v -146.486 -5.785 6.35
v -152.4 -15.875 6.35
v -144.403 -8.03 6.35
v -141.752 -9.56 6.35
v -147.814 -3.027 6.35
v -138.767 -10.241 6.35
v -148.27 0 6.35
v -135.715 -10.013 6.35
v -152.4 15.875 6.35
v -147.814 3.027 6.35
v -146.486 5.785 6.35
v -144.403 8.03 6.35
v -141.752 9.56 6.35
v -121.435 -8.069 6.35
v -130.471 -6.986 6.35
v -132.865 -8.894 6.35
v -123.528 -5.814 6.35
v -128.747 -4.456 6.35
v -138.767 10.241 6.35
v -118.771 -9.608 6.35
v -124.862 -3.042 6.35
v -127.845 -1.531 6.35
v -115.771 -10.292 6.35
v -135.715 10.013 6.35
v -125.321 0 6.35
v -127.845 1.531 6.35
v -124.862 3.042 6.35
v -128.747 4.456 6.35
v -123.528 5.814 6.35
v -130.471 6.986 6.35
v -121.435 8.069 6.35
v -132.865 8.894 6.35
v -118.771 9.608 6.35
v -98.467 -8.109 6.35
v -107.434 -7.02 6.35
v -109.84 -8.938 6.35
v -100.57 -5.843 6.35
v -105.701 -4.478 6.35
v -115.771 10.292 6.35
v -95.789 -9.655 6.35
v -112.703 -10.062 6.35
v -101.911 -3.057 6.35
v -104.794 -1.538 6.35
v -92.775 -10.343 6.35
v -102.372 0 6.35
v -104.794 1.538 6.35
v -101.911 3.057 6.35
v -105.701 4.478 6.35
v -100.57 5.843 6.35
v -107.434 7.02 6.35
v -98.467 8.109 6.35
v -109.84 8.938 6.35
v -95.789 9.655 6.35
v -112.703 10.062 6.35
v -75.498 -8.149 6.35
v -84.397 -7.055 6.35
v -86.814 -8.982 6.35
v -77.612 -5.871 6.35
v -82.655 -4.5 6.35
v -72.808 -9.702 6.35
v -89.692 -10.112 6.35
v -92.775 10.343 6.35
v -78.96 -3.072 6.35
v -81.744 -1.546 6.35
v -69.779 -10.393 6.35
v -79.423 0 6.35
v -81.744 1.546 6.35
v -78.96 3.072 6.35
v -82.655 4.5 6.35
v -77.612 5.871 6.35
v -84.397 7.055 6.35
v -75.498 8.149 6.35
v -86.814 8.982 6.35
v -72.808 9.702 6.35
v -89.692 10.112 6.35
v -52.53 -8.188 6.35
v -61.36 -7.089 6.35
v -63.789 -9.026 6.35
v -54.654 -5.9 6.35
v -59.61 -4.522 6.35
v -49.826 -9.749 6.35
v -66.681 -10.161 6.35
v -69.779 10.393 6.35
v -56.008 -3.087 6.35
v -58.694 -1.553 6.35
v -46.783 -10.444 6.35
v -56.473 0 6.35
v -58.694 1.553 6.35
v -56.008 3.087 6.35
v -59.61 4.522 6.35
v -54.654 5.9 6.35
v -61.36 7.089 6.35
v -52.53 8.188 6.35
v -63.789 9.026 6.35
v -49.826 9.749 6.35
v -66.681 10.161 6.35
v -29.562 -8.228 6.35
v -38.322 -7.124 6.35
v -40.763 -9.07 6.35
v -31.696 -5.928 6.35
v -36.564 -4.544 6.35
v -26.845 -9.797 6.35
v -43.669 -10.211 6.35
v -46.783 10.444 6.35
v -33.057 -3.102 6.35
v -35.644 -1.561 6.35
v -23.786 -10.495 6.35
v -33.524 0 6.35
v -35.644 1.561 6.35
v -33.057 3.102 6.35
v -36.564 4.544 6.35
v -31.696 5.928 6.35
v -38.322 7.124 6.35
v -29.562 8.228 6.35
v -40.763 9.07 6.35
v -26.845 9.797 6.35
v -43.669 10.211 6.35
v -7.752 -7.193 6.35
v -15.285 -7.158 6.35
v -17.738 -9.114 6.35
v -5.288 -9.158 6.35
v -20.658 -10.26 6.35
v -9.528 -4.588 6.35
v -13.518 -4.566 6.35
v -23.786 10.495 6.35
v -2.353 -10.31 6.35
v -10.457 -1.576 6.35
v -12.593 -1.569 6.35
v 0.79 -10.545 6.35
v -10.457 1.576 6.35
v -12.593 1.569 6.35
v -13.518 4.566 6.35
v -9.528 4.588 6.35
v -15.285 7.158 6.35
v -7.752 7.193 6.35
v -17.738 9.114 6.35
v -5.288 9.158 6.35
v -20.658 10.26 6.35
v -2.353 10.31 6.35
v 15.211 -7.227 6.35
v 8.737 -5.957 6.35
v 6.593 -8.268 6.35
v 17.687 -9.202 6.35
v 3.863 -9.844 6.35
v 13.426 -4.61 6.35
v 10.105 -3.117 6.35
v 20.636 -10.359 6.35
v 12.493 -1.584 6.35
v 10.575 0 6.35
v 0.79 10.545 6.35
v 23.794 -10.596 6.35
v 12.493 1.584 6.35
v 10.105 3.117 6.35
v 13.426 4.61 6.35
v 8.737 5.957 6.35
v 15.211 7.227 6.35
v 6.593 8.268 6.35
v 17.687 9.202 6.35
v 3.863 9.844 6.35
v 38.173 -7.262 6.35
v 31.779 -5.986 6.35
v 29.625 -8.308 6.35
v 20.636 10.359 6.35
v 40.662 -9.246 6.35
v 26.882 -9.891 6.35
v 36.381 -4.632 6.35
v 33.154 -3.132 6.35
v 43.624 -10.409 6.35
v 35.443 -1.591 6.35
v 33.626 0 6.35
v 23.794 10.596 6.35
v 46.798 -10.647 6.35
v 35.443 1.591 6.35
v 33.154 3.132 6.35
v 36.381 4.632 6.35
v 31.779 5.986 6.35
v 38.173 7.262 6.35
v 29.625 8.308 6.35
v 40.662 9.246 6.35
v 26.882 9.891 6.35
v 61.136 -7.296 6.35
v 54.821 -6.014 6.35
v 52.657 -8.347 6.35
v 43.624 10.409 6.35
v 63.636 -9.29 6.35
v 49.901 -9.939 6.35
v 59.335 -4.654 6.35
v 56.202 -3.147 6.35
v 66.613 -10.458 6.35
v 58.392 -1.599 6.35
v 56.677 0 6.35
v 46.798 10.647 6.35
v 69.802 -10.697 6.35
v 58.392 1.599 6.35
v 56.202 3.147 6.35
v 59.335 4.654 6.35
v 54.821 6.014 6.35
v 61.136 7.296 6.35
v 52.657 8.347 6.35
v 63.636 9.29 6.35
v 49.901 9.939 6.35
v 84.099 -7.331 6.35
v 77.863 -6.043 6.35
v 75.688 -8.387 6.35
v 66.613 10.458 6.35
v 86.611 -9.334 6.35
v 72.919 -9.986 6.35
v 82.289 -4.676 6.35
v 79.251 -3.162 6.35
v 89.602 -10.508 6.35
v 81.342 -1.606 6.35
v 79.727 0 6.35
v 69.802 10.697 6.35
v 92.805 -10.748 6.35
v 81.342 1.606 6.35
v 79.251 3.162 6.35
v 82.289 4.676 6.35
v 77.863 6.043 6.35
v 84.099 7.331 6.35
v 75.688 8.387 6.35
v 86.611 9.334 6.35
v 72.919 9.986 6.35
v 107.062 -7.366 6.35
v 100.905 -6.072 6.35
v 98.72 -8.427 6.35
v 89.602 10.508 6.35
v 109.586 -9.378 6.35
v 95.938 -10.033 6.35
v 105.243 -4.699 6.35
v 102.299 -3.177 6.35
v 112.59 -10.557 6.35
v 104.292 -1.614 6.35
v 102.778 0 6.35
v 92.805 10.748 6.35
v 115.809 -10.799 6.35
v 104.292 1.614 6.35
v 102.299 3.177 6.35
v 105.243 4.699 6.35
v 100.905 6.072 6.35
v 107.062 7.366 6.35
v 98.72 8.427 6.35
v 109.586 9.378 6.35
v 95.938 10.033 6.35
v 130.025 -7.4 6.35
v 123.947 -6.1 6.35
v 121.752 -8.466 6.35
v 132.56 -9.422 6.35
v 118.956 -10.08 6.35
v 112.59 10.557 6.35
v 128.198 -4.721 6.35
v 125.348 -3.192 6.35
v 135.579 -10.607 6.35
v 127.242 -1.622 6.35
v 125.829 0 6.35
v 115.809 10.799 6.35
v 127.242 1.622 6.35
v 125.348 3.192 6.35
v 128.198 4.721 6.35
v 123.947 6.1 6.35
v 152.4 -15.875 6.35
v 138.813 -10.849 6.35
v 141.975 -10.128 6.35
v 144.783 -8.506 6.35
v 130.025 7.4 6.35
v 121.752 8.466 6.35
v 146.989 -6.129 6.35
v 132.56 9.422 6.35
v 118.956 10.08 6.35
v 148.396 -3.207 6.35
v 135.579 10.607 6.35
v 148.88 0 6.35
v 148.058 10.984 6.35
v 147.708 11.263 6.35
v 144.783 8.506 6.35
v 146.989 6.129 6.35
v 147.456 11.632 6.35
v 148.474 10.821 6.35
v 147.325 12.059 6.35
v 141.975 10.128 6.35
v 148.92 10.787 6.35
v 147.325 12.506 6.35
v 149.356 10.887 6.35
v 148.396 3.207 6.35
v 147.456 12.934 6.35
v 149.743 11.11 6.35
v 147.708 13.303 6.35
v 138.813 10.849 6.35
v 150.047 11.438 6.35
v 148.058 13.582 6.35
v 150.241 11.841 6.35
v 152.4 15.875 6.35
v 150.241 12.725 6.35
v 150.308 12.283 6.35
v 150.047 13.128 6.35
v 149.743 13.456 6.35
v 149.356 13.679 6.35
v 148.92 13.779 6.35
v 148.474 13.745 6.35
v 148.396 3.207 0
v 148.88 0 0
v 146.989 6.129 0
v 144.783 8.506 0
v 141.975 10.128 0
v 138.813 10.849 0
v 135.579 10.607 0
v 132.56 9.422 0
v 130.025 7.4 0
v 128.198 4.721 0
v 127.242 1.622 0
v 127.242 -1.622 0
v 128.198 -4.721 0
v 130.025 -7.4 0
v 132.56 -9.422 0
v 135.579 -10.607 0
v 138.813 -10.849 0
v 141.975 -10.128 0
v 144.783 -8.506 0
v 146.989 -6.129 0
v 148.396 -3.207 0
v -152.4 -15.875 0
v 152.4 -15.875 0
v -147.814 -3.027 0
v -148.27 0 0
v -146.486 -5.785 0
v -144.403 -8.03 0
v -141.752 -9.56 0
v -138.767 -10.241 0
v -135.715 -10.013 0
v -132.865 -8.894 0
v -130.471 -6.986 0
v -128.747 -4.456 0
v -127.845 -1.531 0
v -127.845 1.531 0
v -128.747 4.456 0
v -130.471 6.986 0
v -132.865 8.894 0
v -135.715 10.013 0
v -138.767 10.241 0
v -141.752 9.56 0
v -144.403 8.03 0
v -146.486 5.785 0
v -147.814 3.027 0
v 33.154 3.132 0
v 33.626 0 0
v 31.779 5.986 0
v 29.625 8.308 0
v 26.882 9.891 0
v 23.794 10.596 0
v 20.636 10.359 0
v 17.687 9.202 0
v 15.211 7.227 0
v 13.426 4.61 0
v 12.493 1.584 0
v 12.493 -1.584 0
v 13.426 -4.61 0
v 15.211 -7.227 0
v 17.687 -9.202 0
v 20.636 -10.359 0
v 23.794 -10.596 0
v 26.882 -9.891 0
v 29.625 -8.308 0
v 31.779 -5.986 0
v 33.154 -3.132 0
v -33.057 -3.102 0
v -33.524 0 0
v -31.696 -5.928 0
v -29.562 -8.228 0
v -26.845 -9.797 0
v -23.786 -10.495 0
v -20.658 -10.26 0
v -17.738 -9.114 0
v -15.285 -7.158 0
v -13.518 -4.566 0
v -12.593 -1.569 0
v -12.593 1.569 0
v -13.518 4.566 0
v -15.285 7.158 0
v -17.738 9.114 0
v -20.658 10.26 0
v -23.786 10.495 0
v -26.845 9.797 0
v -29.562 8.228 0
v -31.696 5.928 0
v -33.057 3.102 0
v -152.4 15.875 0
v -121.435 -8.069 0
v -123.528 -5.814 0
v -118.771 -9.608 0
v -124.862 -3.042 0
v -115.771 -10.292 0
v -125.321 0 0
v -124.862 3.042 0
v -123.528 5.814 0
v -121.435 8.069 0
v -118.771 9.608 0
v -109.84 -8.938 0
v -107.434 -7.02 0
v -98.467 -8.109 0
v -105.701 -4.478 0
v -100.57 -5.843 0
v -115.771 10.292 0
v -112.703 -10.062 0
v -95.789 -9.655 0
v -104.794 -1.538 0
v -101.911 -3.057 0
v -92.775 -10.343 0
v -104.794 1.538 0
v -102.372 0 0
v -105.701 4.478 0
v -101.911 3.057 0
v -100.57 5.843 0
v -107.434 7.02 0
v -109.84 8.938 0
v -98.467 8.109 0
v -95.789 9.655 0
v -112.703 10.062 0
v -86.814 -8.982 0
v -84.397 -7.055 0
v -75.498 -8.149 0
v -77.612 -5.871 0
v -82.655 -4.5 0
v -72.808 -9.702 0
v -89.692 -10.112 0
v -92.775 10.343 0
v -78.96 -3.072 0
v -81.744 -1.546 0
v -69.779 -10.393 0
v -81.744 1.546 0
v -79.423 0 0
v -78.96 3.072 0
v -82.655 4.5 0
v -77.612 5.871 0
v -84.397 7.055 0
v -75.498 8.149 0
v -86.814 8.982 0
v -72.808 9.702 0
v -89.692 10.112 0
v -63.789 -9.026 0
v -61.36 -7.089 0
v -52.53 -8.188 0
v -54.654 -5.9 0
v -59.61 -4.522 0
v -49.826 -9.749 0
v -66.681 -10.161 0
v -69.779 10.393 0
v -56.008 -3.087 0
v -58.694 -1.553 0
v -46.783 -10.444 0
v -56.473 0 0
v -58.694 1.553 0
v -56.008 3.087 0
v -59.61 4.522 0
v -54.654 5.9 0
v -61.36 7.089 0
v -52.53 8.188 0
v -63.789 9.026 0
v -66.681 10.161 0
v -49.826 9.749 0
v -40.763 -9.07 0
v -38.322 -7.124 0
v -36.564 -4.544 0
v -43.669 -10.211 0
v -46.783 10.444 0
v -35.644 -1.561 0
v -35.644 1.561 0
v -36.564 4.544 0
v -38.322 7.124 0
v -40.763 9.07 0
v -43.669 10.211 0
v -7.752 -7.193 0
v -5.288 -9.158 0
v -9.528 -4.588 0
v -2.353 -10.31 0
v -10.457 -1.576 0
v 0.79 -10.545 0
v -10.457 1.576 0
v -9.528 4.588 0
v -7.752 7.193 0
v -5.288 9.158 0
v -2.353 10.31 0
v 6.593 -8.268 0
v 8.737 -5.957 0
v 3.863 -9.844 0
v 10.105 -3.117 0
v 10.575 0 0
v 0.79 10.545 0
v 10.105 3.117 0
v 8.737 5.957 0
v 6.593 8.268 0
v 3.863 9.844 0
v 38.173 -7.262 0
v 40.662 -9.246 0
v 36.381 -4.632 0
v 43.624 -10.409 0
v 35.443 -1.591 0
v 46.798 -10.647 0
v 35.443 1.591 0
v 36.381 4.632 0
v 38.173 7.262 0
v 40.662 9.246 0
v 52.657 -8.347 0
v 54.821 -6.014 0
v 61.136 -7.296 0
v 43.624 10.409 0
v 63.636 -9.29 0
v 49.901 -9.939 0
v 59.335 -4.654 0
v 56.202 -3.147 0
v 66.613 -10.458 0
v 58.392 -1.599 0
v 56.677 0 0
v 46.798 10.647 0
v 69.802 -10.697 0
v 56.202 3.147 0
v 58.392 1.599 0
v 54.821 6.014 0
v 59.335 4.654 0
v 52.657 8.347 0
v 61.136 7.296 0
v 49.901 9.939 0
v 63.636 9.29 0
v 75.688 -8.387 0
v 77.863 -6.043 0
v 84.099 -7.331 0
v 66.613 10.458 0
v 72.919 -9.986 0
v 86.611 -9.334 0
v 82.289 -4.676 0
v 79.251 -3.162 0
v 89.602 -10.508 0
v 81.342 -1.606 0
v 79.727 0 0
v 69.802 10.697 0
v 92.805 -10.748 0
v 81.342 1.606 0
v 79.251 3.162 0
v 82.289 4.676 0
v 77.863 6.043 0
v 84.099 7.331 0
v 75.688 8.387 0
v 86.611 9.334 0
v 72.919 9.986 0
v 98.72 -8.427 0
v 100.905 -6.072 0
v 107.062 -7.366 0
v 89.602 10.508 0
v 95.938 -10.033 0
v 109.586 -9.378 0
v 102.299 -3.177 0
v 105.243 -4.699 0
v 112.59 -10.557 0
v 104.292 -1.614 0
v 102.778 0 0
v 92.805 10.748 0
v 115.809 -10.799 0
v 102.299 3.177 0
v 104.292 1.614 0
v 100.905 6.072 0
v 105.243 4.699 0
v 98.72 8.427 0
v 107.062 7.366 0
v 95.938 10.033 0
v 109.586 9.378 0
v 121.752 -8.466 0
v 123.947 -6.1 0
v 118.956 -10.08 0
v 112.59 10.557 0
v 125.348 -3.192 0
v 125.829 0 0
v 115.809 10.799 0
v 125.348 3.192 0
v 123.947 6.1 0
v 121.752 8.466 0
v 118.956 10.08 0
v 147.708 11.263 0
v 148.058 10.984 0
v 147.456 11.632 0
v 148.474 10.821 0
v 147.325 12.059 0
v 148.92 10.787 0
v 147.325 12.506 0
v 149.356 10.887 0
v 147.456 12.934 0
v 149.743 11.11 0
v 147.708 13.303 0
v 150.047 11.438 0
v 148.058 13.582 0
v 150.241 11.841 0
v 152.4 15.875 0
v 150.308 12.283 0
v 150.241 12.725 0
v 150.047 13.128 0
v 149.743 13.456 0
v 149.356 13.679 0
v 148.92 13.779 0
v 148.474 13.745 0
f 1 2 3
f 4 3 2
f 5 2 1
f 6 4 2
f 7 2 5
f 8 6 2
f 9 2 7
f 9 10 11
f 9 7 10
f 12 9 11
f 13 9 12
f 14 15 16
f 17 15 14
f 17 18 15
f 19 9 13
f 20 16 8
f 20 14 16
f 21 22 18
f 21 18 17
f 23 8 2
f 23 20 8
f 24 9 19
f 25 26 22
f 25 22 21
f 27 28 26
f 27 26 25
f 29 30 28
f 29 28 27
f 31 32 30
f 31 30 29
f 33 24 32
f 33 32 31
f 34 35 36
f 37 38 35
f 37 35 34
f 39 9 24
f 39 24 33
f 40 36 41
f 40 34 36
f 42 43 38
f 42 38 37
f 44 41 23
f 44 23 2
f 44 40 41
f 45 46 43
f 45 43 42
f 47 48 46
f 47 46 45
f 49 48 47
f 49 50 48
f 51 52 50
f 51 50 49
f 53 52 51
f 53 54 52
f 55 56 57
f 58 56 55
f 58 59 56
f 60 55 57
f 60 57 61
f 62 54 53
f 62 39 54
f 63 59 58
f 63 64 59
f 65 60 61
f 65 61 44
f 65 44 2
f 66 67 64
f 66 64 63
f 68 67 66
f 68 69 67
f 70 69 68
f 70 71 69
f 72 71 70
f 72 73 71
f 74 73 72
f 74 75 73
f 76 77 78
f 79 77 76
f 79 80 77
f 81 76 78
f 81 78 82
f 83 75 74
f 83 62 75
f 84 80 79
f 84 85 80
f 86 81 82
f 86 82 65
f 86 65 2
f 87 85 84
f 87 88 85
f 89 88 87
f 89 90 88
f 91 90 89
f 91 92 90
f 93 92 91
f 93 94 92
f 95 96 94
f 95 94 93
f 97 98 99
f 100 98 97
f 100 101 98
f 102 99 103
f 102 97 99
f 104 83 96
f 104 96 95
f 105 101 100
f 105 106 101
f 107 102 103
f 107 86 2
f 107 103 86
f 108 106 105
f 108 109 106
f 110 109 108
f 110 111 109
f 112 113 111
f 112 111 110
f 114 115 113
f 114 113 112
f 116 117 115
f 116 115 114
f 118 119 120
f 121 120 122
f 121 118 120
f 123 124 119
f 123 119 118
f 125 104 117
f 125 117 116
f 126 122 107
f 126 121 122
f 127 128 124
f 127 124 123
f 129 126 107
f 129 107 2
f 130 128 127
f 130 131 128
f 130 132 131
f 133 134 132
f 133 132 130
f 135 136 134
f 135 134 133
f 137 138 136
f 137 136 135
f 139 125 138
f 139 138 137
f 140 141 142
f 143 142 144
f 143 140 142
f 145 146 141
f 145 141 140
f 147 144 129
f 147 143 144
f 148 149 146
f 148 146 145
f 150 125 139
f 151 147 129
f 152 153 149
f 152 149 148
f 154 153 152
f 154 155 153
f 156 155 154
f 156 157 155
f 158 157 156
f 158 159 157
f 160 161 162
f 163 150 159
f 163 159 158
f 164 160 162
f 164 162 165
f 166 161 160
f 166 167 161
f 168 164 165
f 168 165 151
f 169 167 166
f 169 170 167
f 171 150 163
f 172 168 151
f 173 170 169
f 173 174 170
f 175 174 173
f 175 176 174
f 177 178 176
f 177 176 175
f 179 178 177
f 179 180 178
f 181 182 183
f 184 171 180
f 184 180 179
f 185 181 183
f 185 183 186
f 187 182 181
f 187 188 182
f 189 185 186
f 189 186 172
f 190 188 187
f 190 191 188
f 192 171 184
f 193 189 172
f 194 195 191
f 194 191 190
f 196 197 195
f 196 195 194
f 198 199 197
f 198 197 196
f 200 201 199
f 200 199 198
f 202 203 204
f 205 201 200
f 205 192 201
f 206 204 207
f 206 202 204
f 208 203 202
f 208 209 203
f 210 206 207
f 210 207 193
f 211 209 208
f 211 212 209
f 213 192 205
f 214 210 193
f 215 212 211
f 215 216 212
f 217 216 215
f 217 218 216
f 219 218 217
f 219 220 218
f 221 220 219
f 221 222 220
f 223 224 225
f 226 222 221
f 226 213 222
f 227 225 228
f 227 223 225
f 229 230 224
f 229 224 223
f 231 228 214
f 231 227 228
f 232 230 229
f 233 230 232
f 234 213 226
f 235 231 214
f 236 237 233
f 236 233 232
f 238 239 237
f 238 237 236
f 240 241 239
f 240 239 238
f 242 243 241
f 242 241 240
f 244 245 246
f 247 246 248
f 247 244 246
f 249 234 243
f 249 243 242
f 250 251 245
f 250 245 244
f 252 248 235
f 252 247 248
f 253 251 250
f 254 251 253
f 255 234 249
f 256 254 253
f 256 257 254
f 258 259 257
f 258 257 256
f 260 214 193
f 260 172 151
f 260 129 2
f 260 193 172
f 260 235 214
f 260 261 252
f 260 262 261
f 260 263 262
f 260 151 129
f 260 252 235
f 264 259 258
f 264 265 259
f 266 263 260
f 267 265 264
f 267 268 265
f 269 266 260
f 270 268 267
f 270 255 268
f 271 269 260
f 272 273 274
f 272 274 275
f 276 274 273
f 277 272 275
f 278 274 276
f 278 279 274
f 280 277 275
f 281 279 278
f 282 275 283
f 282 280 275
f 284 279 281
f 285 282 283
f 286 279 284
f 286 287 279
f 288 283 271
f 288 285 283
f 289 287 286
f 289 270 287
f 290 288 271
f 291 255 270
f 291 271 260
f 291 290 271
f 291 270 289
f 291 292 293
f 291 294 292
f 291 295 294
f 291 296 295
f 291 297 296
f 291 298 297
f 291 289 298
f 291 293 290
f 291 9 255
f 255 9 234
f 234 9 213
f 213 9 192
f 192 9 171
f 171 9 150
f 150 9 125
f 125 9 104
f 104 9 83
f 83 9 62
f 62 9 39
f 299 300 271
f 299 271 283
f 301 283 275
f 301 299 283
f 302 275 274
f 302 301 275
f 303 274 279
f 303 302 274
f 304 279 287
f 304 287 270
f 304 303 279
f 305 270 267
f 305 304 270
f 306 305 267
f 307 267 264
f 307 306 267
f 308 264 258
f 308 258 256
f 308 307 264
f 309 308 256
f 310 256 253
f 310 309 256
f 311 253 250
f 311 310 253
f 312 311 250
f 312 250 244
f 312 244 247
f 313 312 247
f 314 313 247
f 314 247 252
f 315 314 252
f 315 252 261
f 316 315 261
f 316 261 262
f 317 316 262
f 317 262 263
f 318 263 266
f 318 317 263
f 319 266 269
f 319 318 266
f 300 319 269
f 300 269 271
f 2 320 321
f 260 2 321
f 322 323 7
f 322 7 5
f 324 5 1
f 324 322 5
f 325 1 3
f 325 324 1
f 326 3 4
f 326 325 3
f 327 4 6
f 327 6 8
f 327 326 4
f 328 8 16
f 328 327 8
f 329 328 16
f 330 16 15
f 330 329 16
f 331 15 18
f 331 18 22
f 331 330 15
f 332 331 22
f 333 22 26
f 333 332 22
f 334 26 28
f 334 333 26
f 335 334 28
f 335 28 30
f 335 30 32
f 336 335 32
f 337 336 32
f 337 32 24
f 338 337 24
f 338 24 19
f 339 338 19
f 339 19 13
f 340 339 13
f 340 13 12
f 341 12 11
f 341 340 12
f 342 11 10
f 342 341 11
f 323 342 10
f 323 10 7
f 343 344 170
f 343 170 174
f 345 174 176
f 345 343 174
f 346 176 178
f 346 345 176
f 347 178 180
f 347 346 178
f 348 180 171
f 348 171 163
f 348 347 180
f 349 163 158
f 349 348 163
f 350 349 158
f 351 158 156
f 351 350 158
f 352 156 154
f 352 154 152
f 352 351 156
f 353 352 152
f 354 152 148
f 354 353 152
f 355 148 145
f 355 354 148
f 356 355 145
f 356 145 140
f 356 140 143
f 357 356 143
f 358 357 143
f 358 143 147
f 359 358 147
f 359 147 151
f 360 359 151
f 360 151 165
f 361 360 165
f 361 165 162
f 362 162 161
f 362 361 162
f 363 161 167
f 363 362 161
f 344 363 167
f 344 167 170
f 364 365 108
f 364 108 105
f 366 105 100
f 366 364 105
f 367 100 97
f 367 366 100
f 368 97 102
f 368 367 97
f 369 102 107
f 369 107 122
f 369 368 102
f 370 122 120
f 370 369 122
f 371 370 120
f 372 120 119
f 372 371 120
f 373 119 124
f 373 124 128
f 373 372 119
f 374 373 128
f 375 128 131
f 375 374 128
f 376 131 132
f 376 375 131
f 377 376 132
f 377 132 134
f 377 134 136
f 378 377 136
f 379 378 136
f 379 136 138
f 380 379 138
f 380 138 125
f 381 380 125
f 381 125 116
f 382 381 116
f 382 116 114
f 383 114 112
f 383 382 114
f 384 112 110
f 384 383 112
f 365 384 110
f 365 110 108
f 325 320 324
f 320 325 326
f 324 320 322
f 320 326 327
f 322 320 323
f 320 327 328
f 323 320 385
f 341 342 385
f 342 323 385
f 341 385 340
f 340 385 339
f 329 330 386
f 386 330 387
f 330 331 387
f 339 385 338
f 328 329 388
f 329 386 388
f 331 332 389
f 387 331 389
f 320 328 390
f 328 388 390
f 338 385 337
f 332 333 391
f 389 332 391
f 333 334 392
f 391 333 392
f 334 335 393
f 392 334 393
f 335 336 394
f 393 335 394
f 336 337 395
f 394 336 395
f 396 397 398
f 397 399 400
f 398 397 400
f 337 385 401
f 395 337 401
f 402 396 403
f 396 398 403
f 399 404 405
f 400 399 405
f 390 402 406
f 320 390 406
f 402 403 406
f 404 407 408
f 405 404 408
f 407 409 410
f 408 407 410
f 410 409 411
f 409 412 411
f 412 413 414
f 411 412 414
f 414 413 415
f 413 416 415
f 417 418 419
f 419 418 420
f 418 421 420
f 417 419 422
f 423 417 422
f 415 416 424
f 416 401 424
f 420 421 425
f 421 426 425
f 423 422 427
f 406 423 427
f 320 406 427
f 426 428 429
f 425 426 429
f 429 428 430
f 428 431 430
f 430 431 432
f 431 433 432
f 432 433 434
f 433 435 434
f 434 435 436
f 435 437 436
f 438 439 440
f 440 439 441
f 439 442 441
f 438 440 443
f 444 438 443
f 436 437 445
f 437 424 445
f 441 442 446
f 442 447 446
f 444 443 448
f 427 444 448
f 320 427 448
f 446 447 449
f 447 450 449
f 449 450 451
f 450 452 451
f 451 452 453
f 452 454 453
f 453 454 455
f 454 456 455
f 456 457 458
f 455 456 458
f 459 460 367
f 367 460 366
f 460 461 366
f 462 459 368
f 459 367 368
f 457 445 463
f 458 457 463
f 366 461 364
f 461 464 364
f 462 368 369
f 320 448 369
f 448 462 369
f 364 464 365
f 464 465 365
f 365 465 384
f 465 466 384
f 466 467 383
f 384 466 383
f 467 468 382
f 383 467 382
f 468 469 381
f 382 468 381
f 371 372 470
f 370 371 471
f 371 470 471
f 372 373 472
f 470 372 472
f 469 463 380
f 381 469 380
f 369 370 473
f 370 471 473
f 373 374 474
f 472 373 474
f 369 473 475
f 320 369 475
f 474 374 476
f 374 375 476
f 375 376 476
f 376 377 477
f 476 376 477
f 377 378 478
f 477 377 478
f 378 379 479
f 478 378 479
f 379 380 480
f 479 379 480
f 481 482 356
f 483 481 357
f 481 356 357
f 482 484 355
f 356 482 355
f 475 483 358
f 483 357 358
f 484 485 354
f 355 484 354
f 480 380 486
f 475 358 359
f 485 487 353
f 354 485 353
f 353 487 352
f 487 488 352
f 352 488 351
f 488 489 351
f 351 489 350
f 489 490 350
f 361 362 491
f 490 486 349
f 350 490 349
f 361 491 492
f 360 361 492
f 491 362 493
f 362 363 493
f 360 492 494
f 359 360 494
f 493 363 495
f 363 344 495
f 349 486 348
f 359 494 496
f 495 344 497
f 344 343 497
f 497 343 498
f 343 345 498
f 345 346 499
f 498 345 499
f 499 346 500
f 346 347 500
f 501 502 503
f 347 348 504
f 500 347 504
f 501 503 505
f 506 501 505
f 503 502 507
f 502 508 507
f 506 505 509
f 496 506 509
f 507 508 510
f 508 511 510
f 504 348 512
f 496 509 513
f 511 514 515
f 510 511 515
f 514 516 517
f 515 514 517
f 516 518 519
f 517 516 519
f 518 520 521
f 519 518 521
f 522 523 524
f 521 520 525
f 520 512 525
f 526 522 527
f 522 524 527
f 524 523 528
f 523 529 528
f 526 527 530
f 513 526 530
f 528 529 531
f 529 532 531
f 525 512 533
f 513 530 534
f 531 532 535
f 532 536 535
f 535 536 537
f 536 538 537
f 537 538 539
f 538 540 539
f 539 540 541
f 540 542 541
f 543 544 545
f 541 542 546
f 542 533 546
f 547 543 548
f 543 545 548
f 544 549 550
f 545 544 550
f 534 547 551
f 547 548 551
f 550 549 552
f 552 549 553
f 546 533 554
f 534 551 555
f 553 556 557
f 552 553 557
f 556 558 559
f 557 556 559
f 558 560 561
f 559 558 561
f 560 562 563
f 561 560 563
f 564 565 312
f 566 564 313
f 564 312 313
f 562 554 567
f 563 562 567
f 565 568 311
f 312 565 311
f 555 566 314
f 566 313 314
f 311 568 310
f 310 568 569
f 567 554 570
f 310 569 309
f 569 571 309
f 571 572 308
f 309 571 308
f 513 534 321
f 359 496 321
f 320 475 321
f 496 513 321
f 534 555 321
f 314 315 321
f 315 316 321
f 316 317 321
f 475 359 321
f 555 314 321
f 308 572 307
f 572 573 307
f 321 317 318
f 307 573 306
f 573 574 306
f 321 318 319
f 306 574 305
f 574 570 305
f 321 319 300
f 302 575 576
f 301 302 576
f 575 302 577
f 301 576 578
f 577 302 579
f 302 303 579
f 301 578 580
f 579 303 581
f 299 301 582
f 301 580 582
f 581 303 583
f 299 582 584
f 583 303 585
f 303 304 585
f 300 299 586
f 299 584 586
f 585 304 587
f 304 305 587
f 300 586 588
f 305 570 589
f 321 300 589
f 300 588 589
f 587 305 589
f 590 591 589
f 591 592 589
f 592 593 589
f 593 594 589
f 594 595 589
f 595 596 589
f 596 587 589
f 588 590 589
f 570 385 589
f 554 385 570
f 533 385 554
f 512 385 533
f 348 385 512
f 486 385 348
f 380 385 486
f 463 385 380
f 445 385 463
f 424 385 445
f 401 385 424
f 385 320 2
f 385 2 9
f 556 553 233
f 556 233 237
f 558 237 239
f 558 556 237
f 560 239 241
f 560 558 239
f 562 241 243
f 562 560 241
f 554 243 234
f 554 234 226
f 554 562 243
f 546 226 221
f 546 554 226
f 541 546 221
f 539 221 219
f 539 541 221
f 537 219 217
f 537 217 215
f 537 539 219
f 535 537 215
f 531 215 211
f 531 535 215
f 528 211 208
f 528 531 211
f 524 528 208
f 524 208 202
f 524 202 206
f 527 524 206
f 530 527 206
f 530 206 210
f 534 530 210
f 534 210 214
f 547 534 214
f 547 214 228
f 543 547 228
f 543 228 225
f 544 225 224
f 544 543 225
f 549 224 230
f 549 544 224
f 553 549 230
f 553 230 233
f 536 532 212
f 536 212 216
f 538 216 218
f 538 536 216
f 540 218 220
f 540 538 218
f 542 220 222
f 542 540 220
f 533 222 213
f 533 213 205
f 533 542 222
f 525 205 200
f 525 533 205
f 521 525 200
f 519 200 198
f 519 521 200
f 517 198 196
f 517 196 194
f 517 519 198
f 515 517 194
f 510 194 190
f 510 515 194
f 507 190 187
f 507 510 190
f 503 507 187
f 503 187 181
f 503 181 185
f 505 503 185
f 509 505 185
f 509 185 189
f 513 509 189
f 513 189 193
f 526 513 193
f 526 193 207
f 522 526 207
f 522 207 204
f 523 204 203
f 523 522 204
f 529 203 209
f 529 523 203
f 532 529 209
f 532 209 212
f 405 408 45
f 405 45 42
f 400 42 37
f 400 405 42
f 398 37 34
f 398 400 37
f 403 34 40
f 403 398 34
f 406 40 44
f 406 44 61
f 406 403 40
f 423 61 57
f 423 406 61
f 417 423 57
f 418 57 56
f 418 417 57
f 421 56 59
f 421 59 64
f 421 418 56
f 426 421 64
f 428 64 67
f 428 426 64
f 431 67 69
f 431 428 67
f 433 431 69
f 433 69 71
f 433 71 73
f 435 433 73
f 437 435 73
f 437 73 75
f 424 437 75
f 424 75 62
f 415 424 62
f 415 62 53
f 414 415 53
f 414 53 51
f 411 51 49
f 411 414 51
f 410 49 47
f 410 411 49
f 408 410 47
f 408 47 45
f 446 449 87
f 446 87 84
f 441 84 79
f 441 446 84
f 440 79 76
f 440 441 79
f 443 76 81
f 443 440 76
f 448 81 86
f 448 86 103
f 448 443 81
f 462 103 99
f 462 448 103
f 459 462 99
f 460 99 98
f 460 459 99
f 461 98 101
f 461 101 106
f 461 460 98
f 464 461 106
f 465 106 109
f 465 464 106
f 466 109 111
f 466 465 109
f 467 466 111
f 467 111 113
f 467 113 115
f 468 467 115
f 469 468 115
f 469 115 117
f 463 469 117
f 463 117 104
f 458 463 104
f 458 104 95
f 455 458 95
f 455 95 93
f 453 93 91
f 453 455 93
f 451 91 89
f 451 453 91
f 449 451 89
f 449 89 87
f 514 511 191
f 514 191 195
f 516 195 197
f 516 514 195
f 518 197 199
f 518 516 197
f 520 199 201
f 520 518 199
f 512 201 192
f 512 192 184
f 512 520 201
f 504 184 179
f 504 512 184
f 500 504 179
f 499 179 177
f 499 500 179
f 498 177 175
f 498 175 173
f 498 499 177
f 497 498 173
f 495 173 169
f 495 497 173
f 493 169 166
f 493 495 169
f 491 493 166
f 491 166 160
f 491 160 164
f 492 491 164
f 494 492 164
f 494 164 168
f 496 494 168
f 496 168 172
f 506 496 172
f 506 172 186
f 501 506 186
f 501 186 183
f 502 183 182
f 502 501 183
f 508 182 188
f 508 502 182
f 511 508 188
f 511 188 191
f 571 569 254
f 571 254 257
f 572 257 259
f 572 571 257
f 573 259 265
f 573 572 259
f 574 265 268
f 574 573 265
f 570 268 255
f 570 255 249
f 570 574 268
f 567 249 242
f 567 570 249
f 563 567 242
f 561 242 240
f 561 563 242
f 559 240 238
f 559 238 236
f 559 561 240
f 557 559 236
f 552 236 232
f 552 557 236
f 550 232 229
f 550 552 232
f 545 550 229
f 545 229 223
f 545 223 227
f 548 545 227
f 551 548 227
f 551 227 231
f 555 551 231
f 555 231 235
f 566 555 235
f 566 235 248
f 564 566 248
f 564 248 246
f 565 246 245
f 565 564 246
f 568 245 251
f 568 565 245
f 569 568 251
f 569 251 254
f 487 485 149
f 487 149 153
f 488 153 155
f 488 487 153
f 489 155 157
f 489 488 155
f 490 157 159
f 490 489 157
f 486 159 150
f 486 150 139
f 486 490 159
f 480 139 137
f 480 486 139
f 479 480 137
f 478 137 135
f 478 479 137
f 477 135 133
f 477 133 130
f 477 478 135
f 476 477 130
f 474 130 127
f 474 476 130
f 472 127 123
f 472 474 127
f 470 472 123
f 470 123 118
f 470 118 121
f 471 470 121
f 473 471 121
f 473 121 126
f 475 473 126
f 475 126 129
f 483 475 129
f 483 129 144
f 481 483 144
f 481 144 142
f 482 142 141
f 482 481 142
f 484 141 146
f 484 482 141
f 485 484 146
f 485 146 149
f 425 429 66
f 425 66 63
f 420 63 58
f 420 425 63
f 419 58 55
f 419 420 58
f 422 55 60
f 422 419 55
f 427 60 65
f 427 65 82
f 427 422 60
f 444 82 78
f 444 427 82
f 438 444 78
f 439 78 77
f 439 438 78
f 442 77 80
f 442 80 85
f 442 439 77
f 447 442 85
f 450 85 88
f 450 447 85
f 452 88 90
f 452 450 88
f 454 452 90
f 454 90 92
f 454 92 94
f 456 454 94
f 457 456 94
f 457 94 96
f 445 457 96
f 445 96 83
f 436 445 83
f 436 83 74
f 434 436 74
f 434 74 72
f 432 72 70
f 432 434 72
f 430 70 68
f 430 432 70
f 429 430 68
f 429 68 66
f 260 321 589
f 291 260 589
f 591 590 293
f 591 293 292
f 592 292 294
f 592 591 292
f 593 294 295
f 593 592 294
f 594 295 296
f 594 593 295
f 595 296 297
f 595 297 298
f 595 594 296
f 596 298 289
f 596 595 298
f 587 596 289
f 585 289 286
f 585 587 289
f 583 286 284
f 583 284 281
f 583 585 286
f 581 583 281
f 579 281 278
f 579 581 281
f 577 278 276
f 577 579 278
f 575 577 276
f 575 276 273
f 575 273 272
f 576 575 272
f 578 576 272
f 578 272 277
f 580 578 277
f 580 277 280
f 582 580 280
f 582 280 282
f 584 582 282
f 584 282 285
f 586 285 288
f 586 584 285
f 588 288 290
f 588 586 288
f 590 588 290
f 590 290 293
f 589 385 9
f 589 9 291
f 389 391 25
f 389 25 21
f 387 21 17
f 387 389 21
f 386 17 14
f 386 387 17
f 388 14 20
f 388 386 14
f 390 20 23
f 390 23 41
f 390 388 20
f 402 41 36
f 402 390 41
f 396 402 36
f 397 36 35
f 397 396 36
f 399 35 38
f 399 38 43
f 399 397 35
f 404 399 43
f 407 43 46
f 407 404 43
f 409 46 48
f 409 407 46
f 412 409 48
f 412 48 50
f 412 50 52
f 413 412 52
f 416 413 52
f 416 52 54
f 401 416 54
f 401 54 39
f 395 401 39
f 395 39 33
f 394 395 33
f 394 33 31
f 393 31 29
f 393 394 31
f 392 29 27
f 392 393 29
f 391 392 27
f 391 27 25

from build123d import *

# Parameters (mm, degrees)
SKETCH1_W           = 304.8
SKETCH1_H           = 31.75
SKETCH1_R           = 10.575
SKETCH1_R_2         = 10.6258
SKETCH1_R_3         = 10.6766
SKETCH1_R_4         = 10.7274
SKETCH1_R_5         = 10.7782
SKETCH1_R_6         = 10.829
SKETCH1_R_7         = 10.8798
SKETCH1_R_8         = 10.2702
SKETCH1_R_9         = 10.321
SKETCH1_R_10        = 10.3718
SKETCH1_R_11        = 10.4226
SKETCH1_R_12        = 10.4734
SKETCH1_R_13        = 10.5242
SKETCH1_R_14        = 1.5
BOSS_EXTRUDE1_DEPTH = 6.35


with BuildPart() as part:
    # Sketch1 → Boss-Extrude1 (new body)
    with BuildSketch(Plane.XY):
        Rectangle(SKETCH1_W, SKETCH1_H)
        Circle(SKETCH1_R, mode=Mode.SUBTRACT)
        with Locations((23, 0)):
            Circle(SKETCH1_R_2, mode=Mode.SUBTRACT)
        with Locations((46, 0)):
            Circle(SKETCH1_R_3, mode=Mode.SUBTRACT)
        with Locations((69, 0)):
            Circle(SKETCH1_R_4, mode=Mode.SUBTRACT)
        with Locations((92, 0)):
            Circle(SKETCH1_R_5, mode=Mode.SUBTRACT)
        with Locations((115, 0)):
            Circle(SKETCH1_R_6, mode=Mode.SUBTRACT)
        with Locations((138, 0)):
            Circle(SKETCH1_R_7, mode=Mode.SUBTRACT)
        with Locations(Location((-138, 0, 0), (0, 0, 180))):
            Circle(SKETCH1_R_8, mode=Mode.SUBTRACT)
        with Locations(Location((-115, 0, 0), (0, 0, 180))):
            Circle(SKETCH1_R_9, mode=Mode.SUBTRACT)
        with Locations(Location((-92, 0, 0), (0, 0, 180))):
            Circle(SKETCH1_R_10, mode=Mode.SUBTRACT)
        with Locations(Location((-69, 0, 0), (0, 0, 180))):
            Circle(SKETCH1_R_11, mode=Mode.SUBTRACT)
        with Locations(Location((-46, 0, 0), (0, 0, 180))):
            Circle(SKETCH1_R_12, mode=Mode.SUBTRACT)
        with Locations(Location((-23, 0, 0), (0, 0, 180))):
            Circle(SKETCH1_R_13, mode=Mode.SUBTRACT)
        with Locations((148.807897552, 12.282897552)):
            Circle(SKETCH1_R_14, mode=Mode.SUBTRACT)
    extrude(amount=BOSS_EXTRUDE1_DEPTH)


solid = part.part
